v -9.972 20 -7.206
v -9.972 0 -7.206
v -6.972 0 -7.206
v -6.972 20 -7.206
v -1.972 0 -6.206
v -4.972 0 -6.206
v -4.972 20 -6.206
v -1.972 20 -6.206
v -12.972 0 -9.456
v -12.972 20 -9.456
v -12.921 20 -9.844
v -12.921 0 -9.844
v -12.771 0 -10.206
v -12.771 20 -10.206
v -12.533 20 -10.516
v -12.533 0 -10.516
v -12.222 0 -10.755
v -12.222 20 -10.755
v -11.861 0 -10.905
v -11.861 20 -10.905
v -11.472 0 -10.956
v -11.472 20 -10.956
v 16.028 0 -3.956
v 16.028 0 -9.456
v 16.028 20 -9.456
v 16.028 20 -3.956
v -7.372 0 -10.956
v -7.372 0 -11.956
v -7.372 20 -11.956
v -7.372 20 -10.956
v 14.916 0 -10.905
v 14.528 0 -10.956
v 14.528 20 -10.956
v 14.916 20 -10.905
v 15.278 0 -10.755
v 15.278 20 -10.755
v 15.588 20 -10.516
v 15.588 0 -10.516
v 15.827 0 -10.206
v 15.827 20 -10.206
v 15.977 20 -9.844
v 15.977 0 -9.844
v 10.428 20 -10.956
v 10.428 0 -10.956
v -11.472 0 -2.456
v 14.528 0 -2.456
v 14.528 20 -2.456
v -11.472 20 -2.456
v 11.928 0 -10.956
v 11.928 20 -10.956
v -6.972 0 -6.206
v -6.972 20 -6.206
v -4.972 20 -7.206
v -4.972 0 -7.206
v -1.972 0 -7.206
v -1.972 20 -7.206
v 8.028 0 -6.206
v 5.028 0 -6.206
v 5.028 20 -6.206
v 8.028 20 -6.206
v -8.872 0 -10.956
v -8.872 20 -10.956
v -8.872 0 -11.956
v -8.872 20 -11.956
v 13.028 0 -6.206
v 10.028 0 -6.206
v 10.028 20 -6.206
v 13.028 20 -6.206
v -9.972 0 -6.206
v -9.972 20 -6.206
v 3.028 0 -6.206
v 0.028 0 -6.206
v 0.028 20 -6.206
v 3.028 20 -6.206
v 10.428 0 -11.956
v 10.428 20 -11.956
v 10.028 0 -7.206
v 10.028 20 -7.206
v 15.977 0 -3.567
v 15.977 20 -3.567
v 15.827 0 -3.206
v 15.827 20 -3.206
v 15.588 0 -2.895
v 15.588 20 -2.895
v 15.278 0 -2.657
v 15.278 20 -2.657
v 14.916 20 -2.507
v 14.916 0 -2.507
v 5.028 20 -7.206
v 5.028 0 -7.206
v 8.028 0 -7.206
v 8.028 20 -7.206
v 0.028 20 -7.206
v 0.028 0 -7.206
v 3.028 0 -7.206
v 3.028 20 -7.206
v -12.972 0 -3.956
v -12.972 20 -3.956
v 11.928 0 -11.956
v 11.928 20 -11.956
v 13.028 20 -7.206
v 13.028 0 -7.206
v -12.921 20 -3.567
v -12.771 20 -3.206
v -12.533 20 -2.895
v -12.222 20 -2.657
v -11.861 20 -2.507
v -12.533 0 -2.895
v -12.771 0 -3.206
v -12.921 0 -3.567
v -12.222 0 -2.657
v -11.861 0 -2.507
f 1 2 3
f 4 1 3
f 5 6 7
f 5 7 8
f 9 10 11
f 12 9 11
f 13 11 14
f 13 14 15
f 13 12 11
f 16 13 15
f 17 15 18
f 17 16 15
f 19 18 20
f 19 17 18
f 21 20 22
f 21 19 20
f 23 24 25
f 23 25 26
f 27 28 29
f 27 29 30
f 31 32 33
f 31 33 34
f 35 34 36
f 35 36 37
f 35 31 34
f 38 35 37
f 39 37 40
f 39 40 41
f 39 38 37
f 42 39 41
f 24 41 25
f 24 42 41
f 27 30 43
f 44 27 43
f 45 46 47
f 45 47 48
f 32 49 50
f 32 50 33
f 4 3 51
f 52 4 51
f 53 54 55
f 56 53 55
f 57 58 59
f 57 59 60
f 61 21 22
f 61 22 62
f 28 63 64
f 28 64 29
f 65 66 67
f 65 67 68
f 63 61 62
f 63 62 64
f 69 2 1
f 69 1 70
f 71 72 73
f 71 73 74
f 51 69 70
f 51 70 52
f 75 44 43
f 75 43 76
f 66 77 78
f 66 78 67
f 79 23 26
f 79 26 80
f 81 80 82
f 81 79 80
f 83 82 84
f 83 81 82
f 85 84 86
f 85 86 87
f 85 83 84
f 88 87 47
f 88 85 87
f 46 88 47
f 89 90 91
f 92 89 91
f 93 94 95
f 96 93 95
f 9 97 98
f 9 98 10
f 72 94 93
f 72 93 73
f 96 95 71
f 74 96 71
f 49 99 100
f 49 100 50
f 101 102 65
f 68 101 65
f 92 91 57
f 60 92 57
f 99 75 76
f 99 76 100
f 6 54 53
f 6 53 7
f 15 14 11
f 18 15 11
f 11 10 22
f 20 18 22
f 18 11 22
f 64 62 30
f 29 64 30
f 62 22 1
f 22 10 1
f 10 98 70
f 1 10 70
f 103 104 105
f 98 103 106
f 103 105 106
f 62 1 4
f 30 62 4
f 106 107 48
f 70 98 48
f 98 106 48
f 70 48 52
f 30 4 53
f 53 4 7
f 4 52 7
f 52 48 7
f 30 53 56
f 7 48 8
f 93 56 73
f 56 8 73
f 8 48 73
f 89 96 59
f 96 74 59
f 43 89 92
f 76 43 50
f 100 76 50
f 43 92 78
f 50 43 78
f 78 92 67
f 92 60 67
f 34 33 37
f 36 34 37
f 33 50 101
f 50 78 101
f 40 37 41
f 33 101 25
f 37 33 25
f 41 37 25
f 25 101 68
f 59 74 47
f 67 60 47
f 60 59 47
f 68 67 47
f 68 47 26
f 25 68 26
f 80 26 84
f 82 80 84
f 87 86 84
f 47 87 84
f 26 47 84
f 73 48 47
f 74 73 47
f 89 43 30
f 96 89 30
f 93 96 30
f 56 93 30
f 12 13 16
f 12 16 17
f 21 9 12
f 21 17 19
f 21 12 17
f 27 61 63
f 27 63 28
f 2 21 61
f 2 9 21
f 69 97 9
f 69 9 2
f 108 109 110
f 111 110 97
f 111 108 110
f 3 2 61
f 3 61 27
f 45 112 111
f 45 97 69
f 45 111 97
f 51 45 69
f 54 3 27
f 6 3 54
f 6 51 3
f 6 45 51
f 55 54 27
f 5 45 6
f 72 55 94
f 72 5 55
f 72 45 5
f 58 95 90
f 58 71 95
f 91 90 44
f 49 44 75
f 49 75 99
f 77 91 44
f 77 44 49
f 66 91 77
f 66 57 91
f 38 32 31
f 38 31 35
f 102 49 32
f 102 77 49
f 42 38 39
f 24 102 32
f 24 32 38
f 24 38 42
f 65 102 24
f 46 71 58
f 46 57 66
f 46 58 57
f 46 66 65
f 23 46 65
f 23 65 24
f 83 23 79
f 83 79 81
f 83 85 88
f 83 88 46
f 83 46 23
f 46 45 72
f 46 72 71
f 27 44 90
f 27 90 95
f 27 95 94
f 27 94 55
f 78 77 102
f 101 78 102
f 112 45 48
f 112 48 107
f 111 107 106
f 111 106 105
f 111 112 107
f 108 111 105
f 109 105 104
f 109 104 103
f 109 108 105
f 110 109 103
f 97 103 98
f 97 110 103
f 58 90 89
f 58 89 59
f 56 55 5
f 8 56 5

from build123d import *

# Parameters (mm, degrees)
F0_W     = 3
F0_H     = 1
F1_DEPTH = 20


with BuildPart() as f1:
    # F0 (on Front) → F1 (new body)
    with BuildSketch(Plane.XZ):
        with BuildLine():
            Line((14.527637, -2.455674), (-11.472363, -2.455674))
            ThreePointArc((-11.472363, -2.455674), (-12.533023, -2.895014), (-12.972363, -3.955674))
            Line((-12.972363, -3.955674), (-12.972363, -9.455674))
            ThreePointArc((-12.972363, -9.455674), (-12.533023, -10.516334), (-11.472363, -10.955674))
            Line((-11.472363, -10.955674), (-8.872363, -10.955674))
            Line((-8.872363, -10.955674), (-8.872363, -11.955674))
            Line((-8.872363, -11.955674), (-7.372363, -11.955674))
            Line((-7.372363, -11.955674), (-7.372363, -10.955674))
            Line((-7.372363, -10.955674), (10.427637, -10.955674))
            Line((10.427637, -10.955674), (10.427637, -11.955674))
            Line((10.427637, -11.955674), (11.927637, -11.955674))
            Line((11.927637, -11.955674), (11.927637, -10.955674))
            Line((11.927637, -10.955674), (14.527637, -10.955674))
            ThreePointArc((14.527637, -10.955674), (15.588297, -10.516334), (16.027637, -9.455674))
            Line((16.027637, -9.455674), (16.027637, -3.955674))
            ThreePointArc((16.027637, -3.955674), (15.588297, -2.895014), (14.527637, -2.455674))
        make_face()
        with Locations((-8.472363, -6.705674)):
            Rectangle(F0_W, F0_H, mode=Mode.SUBTRACT)
        with Locations((-3.472363, -6.705674)):
            Rectangle(F0_W, F0_H, mode=Mode.SUBTRACT)
        with Locations((1.527637, -6.705674)):
            Rectangle(F0_W, F0_H, mode=Mode.SUBTRACT)
        with Locations((6.527637, -6.705674)):
            Rectangle(F0_W, F0_H, mode=Mode.SUBTRACT)
        with Locations((11.527637, -6.705674)):
            Rectangle(F0_W, F0_H, mode=Mode.SUBTRACT)
    extrude(amount=-F1_DEPTH)


solid = f1.part
